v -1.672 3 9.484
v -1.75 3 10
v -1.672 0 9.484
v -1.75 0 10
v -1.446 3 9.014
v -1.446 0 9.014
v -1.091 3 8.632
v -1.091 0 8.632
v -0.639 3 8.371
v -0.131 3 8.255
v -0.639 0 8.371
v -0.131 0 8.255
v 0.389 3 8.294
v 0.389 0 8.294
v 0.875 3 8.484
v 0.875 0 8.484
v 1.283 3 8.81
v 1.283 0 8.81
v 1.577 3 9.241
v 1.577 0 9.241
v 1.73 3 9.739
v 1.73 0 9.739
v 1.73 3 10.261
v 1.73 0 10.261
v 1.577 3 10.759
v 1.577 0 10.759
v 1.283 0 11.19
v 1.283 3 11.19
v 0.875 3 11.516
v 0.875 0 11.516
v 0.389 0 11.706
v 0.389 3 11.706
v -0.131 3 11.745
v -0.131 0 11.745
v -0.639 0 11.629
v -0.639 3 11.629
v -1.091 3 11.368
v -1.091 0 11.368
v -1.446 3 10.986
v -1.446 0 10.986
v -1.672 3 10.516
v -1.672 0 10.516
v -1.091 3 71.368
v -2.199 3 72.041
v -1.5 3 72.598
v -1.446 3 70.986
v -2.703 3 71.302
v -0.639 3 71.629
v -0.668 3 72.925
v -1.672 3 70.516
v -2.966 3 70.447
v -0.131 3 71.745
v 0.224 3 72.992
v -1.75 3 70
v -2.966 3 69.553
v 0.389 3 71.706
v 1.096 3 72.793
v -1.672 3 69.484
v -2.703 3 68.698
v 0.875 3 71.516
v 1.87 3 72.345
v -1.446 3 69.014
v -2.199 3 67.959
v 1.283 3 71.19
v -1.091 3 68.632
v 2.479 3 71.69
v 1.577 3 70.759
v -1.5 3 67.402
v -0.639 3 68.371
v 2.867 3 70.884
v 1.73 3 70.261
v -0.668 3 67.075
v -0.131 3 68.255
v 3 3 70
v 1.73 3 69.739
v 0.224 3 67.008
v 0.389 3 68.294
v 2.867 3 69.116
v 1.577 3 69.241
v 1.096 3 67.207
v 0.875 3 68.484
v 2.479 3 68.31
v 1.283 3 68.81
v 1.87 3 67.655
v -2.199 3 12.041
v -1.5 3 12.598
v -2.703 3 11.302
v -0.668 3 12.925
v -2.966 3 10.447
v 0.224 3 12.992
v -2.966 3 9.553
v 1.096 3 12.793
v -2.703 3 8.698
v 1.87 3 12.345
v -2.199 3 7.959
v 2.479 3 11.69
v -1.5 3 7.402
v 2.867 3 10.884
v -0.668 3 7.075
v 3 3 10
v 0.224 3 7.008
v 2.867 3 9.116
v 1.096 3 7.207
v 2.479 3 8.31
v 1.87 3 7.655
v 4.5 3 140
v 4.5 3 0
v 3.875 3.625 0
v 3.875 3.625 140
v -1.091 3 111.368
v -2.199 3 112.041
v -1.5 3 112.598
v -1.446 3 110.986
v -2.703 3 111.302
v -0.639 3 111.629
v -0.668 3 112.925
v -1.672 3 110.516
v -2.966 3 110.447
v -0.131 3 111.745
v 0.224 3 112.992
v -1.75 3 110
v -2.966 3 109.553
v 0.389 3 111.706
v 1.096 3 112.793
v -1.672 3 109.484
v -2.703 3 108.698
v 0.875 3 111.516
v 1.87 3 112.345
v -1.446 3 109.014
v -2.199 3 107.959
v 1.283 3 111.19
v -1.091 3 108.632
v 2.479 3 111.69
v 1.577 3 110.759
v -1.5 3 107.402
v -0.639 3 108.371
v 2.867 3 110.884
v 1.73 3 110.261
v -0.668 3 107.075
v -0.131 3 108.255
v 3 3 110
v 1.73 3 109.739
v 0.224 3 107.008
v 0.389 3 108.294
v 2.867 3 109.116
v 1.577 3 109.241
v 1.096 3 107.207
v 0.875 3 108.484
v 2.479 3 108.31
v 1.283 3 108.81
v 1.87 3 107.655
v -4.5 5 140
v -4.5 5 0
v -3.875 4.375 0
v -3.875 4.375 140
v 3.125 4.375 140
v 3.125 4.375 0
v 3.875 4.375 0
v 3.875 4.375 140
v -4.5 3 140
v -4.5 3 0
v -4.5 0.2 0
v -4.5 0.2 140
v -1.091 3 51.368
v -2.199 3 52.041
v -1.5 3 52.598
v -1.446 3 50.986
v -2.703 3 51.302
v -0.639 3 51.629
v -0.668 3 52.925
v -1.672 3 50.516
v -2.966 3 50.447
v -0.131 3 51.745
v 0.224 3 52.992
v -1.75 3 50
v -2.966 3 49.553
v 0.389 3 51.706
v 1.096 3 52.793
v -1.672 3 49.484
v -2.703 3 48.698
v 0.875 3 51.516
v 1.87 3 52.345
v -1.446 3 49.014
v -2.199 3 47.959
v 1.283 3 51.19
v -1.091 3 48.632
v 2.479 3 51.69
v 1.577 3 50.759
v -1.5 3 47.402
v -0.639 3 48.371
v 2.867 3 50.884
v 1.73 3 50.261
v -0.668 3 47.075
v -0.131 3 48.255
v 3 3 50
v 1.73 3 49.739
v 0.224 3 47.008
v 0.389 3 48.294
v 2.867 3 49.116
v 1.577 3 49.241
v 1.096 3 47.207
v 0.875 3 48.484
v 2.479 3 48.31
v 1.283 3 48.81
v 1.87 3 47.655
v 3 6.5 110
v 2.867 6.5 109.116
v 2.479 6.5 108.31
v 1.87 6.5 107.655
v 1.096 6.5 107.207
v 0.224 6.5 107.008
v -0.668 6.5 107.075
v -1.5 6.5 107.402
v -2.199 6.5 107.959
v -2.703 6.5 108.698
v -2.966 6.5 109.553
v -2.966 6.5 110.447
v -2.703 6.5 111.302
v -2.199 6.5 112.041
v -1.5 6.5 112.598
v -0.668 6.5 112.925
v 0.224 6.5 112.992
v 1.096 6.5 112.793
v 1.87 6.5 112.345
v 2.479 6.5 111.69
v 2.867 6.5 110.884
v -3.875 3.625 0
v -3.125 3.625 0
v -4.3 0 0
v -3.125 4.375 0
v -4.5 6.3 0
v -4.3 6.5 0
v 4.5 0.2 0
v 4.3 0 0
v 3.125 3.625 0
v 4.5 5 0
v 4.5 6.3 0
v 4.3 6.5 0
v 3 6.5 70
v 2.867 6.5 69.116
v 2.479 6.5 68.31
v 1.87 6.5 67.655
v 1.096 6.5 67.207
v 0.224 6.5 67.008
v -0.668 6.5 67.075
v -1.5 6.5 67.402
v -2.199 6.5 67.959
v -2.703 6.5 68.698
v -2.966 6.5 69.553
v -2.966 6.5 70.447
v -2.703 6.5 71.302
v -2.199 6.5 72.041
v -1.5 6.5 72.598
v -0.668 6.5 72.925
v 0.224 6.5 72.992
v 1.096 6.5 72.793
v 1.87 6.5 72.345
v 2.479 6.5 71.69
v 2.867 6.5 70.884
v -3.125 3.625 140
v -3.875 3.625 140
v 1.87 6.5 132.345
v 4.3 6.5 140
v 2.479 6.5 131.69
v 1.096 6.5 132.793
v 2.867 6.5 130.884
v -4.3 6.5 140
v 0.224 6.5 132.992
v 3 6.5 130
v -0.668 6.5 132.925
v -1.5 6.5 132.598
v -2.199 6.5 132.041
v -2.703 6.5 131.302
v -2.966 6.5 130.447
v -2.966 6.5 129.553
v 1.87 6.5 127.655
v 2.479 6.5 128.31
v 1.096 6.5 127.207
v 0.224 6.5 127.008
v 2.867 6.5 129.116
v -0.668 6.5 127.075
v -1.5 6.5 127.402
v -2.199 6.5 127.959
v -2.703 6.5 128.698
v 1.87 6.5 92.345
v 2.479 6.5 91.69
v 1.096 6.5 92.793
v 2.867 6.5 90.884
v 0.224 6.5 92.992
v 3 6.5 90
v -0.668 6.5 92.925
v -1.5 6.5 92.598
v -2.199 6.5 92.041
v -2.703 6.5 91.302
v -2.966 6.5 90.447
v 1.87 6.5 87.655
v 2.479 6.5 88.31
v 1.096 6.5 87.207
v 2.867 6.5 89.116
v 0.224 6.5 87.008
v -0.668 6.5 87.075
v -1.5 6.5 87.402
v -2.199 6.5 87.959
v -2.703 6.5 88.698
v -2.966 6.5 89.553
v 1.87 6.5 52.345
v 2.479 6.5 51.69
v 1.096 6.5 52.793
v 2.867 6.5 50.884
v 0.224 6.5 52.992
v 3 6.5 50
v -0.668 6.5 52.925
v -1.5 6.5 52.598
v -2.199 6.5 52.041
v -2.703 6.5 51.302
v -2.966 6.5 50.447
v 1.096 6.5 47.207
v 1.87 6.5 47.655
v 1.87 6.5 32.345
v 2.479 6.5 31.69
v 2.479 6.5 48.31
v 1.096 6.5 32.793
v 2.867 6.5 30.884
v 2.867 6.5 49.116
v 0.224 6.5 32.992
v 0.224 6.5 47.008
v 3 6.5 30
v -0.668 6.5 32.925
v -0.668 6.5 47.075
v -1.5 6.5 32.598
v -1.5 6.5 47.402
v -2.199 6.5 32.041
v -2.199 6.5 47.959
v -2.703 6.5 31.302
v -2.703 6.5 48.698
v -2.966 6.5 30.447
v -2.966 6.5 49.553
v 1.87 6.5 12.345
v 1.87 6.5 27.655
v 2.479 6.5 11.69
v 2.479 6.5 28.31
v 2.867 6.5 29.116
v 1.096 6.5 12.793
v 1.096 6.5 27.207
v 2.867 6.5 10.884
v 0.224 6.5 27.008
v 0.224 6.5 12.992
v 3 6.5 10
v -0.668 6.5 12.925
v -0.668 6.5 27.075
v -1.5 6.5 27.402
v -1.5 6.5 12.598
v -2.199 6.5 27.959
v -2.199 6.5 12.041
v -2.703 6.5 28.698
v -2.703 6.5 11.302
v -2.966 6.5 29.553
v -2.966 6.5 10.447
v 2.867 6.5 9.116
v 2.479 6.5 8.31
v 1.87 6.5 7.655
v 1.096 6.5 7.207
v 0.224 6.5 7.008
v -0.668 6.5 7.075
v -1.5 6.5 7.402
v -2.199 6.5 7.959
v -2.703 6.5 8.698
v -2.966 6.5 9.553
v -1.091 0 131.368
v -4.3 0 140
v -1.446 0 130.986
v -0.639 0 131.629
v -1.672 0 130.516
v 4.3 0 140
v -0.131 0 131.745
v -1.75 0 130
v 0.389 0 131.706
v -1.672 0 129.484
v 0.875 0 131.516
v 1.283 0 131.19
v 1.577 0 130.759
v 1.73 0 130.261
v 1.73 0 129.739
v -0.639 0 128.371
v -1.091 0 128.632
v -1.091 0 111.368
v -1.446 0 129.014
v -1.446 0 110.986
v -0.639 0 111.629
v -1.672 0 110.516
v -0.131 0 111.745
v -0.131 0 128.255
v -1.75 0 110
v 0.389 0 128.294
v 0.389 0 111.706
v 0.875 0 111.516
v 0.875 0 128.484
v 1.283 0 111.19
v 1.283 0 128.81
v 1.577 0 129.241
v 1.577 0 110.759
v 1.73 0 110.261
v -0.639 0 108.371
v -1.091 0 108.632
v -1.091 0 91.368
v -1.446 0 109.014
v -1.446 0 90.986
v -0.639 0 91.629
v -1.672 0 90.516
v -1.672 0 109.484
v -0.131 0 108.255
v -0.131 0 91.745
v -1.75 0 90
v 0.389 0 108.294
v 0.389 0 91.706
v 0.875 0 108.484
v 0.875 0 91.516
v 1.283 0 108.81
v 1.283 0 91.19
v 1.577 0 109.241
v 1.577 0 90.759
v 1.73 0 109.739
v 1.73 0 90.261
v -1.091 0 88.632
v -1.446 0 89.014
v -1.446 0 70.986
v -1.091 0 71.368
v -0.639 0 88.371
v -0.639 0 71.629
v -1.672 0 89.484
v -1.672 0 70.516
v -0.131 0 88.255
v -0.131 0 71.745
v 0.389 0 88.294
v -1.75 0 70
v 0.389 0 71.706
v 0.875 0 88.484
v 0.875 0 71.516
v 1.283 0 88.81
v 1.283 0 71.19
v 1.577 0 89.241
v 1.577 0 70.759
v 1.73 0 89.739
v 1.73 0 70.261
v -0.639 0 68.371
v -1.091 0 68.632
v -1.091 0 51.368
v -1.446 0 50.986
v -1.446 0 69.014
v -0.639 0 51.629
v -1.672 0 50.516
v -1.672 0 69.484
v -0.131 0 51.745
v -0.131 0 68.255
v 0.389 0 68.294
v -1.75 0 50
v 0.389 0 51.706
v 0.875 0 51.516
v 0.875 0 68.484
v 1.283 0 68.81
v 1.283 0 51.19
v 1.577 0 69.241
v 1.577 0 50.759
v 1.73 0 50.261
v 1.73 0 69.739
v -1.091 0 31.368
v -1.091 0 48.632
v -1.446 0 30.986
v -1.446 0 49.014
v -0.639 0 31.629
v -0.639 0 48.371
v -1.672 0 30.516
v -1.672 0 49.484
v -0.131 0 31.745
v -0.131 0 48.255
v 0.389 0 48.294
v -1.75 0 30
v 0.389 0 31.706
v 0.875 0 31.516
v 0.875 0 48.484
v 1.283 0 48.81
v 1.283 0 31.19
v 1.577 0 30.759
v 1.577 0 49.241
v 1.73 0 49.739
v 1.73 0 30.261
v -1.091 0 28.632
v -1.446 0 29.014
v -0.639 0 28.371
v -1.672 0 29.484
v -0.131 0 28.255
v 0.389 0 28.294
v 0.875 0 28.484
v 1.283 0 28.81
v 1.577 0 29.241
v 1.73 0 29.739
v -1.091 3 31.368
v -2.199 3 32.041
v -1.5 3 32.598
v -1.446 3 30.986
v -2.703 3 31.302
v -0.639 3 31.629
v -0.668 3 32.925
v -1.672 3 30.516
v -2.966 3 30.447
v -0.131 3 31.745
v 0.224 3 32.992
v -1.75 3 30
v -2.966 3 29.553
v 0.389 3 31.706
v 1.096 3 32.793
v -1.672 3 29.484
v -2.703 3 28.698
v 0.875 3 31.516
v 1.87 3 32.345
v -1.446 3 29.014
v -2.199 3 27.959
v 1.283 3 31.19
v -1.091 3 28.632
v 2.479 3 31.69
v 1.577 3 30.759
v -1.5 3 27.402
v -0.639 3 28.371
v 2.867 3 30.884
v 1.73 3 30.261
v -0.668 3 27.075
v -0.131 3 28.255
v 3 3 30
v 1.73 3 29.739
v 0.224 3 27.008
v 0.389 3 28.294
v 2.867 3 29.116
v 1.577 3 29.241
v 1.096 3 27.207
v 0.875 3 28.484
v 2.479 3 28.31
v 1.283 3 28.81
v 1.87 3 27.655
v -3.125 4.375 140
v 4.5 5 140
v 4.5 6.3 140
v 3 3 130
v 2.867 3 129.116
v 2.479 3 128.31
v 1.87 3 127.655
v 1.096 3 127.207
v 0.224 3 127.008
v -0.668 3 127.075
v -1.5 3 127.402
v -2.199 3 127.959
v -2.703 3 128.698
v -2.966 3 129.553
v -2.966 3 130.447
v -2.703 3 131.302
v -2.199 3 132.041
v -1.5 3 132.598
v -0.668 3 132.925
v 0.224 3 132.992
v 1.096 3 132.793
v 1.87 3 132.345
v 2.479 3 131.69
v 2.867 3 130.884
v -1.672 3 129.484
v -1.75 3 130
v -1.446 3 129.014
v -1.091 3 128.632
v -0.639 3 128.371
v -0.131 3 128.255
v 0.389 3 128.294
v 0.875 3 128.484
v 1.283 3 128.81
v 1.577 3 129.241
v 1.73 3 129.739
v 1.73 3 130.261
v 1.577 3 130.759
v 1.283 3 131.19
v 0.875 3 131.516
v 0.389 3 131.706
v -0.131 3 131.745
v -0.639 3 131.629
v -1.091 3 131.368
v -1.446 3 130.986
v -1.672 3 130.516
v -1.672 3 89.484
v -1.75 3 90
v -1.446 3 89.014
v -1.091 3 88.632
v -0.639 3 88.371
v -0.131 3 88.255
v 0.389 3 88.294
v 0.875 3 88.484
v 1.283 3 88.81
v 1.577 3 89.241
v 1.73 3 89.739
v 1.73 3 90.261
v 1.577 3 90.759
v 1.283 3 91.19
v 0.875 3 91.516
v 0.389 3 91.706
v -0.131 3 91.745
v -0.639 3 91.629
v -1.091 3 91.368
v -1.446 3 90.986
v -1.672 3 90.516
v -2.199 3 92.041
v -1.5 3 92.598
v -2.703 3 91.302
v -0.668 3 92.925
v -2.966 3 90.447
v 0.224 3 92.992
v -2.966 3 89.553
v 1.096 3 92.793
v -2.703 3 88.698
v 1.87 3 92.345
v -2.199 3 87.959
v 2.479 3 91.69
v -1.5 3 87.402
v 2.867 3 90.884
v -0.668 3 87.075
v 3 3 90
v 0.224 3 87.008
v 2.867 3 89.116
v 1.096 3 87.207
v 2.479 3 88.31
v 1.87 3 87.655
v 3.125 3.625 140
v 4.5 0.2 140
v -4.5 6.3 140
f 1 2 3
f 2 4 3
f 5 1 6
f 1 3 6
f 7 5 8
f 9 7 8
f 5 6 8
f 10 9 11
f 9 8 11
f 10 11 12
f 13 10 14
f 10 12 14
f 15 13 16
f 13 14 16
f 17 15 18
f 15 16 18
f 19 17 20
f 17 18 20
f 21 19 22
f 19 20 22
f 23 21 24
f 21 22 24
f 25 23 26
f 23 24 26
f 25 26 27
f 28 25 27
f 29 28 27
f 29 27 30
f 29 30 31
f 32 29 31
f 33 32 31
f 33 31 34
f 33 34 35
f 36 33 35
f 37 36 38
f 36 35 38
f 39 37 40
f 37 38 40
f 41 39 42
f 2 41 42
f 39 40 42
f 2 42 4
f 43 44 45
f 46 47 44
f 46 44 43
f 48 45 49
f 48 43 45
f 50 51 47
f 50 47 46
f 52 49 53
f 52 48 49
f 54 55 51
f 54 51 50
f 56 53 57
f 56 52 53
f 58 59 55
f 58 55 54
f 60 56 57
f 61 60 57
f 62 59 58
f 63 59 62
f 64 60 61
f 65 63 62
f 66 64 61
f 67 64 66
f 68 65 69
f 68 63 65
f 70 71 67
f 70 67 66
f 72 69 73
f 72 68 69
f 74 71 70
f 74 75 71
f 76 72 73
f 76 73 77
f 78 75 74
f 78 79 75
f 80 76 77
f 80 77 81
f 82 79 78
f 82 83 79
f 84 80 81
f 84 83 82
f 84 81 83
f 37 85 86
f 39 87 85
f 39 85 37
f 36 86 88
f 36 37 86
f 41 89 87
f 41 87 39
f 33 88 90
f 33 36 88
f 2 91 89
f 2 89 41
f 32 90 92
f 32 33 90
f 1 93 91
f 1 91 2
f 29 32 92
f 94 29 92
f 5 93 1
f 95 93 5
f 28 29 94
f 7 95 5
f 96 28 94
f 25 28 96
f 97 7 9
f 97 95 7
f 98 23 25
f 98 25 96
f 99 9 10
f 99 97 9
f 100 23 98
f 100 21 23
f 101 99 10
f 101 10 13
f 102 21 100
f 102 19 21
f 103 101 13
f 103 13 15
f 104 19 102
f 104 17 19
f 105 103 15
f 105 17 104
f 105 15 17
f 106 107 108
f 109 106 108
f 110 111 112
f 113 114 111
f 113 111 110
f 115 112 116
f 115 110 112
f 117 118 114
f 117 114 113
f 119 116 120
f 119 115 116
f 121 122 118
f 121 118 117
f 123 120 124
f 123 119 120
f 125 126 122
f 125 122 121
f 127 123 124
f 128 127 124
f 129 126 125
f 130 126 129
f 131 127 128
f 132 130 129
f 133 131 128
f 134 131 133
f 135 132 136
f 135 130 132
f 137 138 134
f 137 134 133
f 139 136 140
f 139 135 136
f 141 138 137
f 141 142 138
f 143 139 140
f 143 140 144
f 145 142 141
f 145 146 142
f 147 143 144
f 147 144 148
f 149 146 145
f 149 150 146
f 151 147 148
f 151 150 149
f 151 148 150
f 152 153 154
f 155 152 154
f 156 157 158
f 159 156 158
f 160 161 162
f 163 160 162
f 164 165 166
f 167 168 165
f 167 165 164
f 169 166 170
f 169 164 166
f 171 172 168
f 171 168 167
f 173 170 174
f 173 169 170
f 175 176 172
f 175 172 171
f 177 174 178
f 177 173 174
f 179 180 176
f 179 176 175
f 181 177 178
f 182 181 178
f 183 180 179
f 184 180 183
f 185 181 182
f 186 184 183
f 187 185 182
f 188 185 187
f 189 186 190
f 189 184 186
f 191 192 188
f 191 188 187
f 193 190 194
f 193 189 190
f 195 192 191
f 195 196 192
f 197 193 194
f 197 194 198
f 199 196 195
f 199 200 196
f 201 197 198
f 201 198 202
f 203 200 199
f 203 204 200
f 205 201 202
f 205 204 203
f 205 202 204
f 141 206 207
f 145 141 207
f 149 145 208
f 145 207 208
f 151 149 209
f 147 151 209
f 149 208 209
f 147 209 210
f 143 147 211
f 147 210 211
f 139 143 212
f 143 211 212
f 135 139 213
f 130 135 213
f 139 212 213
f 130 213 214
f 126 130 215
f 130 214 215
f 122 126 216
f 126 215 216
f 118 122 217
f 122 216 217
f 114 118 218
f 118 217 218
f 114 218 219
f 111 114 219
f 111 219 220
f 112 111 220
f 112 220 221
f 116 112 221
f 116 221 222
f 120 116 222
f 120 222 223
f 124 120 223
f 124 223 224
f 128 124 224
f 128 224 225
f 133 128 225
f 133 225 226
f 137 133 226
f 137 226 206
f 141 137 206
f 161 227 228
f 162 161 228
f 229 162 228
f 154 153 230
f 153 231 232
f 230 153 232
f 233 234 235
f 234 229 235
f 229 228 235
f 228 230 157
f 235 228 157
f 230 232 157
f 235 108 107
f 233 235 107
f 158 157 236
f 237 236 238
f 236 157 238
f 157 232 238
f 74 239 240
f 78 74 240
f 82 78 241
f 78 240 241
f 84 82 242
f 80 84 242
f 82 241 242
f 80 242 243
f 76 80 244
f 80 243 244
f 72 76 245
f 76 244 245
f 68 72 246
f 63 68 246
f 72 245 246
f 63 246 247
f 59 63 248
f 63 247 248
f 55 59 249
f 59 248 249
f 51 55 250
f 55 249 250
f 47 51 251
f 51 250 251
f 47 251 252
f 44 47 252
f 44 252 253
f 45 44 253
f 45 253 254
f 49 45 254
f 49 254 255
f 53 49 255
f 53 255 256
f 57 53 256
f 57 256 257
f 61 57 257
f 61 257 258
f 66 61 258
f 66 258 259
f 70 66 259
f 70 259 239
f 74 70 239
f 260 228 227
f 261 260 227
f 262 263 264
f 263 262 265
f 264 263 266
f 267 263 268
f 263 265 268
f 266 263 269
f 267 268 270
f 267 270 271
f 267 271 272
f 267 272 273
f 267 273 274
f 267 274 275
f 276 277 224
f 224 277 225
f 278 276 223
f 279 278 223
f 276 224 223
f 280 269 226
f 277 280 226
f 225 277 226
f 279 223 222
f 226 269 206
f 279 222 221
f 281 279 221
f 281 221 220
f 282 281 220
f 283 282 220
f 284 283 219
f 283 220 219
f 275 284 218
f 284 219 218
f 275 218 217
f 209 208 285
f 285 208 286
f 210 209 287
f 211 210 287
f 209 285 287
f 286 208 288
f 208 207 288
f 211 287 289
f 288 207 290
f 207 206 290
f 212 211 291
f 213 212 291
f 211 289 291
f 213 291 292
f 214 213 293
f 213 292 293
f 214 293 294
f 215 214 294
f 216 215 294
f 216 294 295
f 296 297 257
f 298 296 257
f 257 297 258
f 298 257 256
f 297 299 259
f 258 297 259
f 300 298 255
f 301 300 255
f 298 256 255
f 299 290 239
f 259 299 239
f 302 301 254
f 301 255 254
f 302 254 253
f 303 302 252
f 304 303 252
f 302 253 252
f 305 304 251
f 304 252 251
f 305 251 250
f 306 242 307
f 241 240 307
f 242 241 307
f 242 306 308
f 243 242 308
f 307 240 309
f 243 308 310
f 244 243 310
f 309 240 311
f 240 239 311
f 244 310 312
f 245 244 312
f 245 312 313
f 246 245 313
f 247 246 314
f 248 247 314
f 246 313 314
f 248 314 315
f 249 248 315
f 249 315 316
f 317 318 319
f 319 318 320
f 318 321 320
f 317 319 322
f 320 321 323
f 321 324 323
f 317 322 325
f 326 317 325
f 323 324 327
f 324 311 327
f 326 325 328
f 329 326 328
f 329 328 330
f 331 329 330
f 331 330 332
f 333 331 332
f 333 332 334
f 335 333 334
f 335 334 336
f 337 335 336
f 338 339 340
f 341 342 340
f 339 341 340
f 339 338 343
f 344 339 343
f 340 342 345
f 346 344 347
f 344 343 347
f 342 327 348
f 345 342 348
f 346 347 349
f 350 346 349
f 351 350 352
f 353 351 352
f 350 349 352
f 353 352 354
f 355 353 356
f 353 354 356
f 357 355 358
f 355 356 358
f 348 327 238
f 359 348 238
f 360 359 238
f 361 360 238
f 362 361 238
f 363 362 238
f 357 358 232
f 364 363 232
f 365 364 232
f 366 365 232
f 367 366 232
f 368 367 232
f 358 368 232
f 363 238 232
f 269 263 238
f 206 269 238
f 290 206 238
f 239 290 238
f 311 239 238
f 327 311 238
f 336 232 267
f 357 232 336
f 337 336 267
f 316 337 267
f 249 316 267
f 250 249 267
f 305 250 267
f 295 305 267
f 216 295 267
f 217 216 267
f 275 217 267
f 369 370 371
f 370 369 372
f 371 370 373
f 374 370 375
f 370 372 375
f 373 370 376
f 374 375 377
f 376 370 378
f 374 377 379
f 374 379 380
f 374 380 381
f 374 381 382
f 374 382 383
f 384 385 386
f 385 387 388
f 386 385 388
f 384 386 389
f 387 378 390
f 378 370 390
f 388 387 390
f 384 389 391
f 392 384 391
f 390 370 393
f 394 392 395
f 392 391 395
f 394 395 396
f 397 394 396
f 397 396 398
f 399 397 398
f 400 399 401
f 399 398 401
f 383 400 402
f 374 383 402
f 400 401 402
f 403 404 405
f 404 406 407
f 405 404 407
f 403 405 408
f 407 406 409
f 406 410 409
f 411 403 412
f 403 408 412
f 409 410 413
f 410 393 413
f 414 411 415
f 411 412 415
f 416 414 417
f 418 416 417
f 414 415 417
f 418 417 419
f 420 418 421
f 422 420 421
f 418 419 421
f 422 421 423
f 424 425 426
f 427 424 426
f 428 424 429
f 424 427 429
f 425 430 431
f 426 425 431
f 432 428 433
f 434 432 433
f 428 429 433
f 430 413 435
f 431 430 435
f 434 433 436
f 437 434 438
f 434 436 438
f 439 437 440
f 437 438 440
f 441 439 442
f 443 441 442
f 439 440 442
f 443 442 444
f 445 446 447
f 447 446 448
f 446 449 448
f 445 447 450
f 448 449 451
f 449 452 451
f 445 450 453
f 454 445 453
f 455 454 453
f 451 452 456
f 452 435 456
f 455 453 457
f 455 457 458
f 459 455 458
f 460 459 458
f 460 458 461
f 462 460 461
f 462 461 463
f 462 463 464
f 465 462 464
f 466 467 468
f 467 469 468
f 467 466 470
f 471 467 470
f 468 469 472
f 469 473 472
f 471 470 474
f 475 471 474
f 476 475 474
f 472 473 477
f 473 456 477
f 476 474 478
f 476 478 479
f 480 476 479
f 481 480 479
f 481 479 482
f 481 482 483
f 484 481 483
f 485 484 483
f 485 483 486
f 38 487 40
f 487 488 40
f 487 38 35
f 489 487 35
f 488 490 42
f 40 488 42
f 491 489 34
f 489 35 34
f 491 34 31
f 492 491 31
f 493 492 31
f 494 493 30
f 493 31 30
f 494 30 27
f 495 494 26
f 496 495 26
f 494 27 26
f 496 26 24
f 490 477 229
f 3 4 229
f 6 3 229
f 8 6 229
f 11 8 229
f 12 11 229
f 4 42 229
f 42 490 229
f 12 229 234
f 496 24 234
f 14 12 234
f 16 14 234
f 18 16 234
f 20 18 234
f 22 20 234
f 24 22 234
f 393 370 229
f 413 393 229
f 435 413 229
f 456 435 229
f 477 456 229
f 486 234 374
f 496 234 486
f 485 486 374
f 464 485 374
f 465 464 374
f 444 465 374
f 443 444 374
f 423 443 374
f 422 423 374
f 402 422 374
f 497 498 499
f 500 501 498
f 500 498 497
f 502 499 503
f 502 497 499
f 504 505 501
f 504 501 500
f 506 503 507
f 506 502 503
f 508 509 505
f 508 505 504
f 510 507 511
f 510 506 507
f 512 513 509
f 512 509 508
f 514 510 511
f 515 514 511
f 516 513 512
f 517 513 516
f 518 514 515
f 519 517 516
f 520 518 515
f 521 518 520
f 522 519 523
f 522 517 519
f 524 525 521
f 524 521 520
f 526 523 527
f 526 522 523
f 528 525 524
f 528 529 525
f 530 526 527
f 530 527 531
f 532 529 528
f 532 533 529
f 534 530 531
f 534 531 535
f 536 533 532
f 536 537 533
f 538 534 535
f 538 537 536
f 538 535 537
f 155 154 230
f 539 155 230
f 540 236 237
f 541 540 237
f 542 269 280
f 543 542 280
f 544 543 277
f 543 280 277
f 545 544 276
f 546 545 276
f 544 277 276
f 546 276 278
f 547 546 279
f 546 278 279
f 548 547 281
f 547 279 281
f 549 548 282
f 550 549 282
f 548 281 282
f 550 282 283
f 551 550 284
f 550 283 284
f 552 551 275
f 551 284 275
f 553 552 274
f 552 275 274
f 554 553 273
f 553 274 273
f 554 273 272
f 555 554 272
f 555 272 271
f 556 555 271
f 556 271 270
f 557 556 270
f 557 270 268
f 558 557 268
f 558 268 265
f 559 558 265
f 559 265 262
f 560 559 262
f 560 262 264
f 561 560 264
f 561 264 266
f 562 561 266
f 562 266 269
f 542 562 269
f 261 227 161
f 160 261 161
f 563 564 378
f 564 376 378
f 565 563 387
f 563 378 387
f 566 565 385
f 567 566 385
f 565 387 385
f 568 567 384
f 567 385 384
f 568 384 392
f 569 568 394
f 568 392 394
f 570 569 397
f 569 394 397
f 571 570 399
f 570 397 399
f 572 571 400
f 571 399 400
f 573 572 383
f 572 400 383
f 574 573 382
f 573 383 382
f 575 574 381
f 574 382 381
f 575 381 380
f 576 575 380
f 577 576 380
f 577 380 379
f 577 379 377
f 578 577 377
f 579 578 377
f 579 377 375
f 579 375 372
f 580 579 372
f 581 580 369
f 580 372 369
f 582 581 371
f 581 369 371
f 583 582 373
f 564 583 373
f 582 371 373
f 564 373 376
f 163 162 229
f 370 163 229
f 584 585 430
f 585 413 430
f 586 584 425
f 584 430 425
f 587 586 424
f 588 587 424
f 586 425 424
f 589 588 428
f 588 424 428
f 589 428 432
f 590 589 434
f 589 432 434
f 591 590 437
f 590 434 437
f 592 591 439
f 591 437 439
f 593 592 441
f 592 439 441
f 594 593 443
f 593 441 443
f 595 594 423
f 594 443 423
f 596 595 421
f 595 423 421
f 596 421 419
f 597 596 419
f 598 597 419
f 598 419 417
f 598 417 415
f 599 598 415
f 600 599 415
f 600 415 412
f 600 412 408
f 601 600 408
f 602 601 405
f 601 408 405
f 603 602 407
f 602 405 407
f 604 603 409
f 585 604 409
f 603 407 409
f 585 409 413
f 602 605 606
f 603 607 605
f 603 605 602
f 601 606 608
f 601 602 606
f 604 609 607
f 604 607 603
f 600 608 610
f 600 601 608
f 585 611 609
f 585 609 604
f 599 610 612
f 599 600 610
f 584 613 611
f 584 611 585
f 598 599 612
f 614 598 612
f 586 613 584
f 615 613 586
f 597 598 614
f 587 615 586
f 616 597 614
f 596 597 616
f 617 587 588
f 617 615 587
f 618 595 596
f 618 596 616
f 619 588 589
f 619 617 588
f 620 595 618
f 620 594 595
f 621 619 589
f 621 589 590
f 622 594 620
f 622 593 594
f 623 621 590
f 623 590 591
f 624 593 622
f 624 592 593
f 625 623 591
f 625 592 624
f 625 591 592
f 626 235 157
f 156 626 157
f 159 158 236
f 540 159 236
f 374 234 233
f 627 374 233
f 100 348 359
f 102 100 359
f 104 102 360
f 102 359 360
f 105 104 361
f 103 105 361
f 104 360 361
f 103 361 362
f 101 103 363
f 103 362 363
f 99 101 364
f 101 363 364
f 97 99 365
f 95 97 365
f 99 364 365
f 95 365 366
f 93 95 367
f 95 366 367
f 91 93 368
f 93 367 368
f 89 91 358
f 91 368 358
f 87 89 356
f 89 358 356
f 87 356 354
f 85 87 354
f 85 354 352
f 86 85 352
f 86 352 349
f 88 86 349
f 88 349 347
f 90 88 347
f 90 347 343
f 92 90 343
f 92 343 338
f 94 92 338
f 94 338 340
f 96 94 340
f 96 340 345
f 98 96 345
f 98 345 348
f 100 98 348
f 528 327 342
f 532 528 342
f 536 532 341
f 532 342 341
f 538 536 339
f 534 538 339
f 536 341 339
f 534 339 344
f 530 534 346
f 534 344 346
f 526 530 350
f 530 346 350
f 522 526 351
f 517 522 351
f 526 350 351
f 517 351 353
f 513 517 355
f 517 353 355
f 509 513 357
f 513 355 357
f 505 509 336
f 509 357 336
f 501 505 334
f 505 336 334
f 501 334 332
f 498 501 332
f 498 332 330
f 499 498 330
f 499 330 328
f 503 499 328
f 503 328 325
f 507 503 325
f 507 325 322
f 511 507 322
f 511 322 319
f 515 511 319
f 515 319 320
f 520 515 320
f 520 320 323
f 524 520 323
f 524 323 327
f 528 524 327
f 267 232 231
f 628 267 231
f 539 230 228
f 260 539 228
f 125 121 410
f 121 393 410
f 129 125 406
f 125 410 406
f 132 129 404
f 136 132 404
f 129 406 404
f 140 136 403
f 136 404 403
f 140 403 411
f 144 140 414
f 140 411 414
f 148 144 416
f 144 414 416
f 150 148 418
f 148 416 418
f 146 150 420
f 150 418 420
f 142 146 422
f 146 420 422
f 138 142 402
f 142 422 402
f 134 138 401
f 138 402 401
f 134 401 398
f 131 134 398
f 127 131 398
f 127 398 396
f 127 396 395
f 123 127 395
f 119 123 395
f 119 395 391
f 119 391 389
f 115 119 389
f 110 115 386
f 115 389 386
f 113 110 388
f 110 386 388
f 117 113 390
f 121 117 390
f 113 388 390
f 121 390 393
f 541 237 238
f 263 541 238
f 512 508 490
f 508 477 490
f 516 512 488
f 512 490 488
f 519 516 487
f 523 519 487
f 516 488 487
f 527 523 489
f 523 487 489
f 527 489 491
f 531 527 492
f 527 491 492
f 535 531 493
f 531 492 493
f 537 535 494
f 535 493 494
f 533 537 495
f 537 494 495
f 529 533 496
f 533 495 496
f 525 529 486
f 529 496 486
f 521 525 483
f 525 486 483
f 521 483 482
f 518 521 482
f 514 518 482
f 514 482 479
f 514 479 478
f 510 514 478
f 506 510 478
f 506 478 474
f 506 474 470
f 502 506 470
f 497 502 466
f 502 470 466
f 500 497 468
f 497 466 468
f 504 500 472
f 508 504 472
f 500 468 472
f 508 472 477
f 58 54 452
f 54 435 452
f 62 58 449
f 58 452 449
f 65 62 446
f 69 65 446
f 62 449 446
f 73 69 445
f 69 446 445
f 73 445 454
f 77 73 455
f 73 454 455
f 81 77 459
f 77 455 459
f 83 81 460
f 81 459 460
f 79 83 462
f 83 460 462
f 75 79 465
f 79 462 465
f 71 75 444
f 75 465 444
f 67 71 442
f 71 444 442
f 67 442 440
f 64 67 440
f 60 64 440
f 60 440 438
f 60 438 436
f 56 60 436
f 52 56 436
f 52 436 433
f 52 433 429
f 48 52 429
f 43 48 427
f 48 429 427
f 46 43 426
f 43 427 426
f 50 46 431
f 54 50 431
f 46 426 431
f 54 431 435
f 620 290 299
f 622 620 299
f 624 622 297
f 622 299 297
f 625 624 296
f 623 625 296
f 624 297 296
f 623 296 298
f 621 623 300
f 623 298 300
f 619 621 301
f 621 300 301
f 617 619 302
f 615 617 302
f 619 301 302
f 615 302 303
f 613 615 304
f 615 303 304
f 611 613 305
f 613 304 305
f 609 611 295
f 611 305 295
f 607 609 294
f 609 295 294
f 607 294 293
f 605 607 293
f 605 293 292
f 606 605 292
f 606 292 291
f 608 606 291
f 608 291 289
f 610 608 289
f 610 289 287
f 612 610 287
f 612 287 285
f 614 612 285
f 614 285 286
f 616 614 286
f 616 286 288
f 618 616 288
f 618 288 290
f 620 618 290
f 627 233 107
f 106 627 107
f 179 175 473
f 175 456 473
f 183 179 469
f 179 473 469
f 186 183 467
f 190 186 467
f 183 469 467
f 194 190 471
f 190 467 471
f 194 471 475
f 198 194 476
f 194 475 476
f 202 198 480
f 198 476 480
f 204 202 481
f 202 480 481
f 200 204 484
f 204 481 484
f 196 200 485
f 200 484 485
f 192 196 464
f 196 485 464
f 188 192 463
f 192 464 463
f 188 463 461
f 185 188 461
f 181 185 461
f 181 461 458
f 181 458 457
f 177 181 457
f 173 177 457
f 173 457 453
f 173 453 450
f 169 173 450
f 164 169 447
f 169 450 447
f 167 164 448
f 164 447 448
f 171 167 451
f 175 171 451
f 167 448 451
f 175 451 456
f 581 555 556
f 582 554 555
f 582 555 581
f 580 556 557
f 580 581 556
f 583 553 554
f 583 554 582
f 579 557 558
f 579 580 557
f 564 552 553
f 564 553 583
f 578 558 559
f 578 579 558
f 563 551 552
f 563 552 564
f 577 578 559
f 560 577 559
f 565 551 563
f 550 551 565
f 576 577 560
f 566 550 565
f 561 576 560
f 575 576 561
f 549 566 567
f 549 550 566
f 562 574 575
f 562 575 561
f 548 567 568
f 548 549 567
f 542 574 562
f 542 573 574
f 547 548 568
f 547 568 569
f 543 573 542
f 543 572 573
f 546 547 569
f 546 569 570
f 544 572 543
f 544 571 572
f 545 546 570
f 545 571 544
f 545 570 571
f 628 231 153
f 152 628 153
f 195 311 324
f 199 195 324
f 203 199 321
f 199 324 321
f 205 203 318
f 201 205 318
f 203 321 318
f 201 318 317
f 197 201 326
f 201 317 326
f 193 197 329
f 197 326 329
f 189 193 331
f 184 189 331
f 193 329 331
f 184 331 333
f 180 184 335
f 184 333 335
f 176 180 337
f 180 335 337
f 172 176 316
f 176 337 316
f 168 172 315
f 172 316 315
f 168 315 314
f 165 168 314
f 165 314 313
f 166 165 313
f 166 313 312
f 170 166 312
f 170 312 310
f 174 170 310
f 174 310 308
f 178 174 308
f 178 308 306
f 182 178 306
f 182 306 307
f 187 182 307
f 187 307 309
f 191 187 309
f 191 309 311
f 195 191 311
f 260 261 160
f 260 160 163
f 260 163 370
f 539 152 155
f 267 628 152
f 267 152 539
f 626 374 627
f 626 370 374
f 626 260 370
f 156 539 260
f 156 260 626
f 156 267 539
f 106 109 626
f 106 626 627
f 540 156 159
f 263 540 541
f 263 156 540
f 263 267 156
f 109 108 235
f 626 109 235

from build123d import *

# Parameters (mm, degrees)
EXTRUDE_1_DEPTH           = 140
HOLE_WIZARD_1_D           = 3.5
HOLE_WIZARD_1_CBORE_D     = 6
HOLE_WIZARD_1_CBORE_DEPTH = 3.5
PATTERN_LINEAR_1_COUNT    = 7
PATTERN_LINEAR_1_PITCH    = 20


with BuildPart() as part:
    # 草图1 → 凸台-拉伸1 (new body)
    with BuildSketch(Plane.XY):
        Polygon((4.3, 0), (4.5, 0.2), (4.5, 3), (3.875, 3.625), (3.125, 3.625), (3.125, 4.375), (3.875, 4.375), (4.5, 5), (4.5, 6.3), (4.3, 6.5), (-4.3, 6.5), (-4.5, 6.3), (-4.5, 5), (-3.875, 4.375), (-3.125, 4.375), (-3.125, 3.625), (-3.875, 3.625), (-4.5, 3), (-4.5, 0.2), (-4.3, 0), align=None)
    extrude(amount=EXTRUDE_1_DEPTH)

    # 打孔尺寸(%根据)内六角圆柱头螺钉的类型1 (through all)
    with Locations(Plane(origin=(0, 6.5, 0), x_dir=(1, 0, 0), z_dir=(0, 1, 0))):
        with Locations((0, -10)):
            hole_wizard_1 = CounterBoreHole(HOLE_WIZARD_1_D / 2, HOLE_WIZARD_1_CBORE_D / 2, HOLE_WIZARD_1_CBORE_DEPTH)

    # 阵列(线性)1: 打孔尺寸(%根据)内六角圆柱头螺钉的类型1 ×7
    with Locations(*[(0, 0, i * PATTERN_LINEAR_1_PITCH) for i in range(1, PATTERN_LINEAR_1_COUNT)]):
        add(hole_wizard_1, mode=Mode.SUBTRACT)


solid = part.part
